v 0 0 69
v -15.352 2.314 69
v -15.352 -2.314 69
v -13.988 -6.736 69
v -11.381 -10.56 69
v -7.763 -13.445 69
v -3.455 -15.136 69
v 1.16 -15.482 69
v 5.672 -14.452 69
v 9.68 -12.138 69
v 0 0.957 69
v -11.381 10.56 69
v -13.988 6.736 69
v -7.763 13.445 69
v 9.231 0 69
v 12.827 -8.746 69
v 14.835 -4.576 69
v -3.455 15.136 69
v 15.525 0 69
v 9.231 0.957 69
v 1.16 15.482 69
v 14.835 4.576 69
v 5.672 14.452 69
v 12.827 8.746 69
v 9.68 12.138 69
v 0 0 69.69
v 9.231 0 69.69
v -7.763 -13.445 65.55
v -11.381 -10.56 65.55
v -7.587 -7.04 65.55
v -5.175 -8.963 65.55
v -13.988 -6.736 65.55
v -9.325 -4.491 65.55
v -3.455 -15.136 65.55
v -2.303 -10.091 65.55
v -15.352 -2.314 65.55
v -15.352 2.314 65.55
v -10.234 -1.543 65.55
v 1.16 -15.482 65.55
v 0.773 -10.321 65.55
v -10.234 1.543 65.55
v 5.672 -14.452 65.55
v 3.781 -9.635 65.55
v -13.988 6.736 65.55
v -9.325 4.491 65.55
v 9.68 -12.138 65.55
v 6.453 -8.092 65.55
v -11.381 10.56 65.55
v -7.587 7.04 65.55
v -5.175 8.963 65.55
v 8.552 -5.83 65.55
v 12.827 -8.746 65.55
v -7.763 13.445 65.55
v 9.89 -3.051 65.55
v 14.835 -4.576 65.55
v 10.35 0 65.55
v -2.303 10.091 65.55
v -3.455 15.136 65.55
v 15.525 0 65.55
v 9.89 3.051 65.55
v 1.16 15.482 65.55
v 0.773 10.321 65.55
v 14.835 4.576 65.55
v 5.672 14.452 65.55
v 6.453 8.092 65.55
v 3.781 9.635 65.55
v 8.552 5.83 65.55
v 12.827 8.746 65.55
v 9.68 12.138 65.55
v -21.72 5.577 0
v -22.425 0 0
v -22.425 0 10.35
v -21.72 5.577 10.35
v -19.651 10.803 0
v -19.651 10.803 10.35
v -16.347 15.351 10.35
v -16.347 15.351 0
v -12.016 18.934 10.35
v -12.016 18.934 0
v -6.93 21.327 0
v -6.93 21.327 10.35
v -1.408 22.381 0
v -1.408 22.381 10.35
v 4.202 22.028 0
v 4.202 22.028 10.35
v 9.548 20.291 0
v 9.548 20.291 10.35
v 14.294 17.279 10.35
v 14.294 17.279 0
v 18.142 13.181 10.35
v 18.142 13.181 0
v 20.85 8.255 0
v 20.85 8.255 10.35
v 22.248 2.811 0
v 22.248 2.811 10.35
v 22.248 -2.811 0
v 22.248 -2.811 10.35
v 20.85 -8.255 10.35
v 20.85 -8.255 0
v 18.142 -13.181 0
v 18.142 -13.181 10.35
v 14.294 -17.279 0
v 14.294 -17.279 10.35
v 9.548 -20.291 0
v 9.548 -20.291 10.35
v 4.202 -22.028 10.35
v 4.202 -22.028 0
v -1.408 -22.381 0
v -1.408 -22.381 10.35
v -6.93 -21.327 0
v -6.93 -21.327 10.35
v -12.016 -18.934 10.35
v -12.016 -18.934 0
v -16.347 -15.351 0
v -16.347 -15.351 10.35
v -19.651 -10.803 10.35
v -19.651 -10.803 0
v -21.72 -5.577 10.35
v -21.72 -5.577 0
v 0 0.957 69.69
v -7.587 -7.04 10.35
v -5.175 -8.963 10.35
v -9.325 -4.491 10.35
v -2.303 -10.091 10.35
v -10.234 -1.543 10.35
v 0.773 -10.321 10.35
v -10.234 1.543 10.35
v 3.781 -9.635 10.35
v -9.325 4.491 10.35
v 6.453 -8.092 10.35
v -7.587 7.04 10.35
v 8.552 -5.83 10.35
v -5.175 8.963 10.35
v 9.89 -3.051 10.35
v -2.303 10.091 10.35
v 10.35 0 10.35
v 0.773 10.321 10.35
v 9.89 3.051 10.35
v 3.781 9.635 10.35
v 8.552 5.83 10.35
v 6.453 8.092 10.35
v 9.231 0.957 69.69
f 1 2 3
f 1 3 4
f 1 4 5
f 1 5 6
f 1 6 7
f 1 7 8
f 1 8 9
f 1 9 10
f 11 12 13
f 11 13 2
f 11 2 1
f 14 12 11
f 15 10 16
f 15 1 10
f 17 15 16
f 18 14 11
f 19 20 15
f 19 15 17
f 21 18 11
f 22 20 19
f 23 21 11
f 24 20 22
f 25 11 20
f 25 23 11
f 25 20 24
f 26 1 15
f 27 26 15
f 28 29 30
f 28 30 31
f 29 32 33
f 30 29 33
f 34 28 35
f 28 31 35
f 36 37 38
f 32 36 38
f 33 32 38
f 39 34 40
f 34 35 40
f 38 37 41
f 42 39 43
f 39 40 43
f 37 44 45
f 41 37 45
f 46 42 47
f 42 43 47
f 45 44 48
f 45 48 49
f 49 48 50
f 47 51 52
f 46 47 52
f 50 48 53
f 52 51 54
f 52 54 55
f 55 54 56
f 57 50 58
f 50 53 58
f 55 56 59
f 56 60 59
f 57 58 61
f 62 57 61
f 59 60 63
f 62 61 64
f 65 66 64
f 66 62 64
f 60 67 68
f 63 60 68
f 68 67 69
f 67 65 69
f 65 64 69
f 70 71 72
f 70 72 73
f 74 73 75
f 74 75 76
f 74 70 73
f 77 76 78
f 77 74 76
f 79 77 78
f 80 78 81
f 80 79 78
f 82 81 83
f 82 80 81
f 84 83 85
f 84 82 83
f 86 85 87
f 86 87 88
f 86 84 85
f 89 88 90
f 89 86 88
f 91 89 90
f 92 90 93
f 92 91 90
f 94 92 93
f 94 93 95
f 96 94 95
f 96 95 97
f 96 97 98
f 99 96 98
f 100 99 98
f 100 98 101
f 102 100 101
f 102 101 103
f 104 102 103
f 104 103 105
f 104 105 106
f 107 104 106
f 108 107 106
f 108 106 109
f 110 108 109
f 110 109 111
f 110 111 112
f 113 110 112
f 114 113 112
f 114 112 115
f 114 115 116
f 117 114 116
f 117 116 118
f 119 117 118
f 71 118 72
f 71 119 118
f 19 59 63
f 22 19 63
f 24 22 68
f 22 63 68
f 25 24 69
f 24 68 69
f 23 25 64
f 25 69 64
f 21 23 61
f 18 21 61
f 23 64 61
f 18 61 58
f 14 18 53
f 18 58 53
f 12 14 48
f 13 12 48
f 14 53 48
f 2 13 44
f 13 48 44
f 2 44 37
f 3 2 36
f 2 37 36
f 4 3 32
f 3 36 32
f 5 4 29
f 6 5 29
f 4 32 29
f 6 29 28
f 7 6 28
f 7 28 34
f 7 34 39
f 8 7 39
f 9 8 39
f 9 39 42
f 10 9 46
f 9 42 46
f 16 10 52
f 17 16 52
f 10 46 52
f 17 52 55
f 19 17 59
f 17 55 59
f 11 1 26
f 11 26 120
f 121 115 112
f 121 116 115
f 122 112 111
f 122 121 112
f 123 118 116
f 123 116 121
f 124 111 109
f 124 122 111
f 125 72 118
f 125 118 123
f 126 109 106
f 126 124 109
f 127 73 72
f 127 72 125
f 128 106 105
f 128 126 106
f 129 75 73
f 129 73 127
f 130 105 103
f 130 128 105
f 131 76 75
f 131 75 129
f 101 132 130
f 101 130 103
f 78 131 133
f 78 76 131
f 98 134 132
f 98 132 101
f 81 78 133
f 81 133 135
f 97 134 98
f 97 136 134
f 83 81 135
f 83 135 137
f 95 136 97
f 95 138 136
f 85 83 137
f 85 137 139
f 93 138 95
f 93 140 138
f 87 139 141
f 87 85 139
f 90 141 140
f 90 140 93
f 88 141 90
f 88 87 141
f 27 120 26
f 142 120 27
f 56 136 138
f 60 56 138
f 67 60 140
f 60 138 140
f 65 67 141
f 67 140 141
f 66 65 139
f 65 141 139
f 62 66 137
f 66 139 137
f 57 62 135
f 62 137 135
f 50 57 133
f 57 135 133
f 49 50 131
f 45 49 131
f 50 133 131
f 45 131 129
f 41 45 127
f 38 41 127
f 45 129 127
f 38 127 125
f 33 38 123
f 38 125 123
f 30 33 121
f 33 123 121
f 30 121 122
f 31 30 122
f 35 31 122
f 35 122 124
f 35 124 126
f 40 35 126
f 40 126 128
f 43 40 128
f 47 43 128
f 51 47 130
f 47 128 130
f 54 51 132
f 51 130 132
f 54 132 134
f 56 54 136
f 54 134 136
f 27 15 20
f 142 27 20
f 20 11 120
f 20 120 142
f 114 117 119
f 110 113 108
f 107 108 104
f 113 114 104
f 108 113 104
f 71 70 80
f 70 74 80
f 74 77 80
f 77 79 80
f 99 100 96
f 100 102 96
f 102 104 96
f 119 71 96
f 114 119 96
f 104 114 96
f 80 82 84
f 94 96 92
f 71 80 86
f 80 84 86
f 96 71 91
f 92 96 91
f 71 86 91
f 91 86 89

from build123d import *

# Parameters (mm, degrees)
SKETCH_1_R          = 80
EXTRUDE_1_DEPTH     = 30
SKETCH_2_R          = 30
EXTRUDE_2_DEPTH     = 160
SKETCH_3_R          = 45
EXTRUDE_3_DEPTH     = 10
SKETCH_5_W          = 26.757416482
SKETCH_5_H          = 2.773634635
EXTRUDE_6_DEPTH     = 2
SKETCH_6_R          = 97.779490514
SKETCH_6_R_2        = 65
CUT_EXTRUDE_1_DEPTH = 42
SCALE_2_SCALE       = 0.345


with BuildPart() as part:
    # 草图1 → 凸台-拉伸1 (new body)
    with BuildSketch(Plane.XY):
        Circle(SKETCH_1_R)
    extrude(amount=EXTRUDE_1_DEPTH)

    # 草图2 → 凸台-拉伸2 (add)
    with BuildSketch(Plane.XY.offset(30)):
        Circle(SKETCH_2_R)
    extrude(amount=EXTRUDE_2_DEPTH)

    # 草图3 → 凸台-拉伸3 (add)
    with BuildSketch(Plane.XY.offset(190)):
        Circle(SKETCH_3_R)
    extrude(amount=EXTRUDE_3_DEPTH)

    # 草图5 → 凸台-拉伸6 (add)
    with BuildSketch(Plane.XY.offset(200)):
        with Locations((13.378708241, 1.386817318)):
            Rectangle(SKETCH_5_W, SKETCH_5_H)
    extrude(amount=EXTRUDE_6_DEPTH)

    # 草图6 → 切除-拉伸1 (cut)
    with BuildSketch(Plane(origin=(0, 0, 0), x_dir=(-1, 0, 0), z_dir=(0, 0, -1))):
        Circle(SKETCH_6_R)
        Circle(SKETCH_6_R_2, mode=Mode.SUBTRACT)
    extrude(amount=-CUT_EXTRUDE_1_DEPTH, mode=Mode.SUBTRACT)


with BuildPart() as part_1:
    # 缩放比例2: scaled about (0, 0, 0)
    add(part.part.scale(SCALE_2_SCALE))


solid = part_1.part
